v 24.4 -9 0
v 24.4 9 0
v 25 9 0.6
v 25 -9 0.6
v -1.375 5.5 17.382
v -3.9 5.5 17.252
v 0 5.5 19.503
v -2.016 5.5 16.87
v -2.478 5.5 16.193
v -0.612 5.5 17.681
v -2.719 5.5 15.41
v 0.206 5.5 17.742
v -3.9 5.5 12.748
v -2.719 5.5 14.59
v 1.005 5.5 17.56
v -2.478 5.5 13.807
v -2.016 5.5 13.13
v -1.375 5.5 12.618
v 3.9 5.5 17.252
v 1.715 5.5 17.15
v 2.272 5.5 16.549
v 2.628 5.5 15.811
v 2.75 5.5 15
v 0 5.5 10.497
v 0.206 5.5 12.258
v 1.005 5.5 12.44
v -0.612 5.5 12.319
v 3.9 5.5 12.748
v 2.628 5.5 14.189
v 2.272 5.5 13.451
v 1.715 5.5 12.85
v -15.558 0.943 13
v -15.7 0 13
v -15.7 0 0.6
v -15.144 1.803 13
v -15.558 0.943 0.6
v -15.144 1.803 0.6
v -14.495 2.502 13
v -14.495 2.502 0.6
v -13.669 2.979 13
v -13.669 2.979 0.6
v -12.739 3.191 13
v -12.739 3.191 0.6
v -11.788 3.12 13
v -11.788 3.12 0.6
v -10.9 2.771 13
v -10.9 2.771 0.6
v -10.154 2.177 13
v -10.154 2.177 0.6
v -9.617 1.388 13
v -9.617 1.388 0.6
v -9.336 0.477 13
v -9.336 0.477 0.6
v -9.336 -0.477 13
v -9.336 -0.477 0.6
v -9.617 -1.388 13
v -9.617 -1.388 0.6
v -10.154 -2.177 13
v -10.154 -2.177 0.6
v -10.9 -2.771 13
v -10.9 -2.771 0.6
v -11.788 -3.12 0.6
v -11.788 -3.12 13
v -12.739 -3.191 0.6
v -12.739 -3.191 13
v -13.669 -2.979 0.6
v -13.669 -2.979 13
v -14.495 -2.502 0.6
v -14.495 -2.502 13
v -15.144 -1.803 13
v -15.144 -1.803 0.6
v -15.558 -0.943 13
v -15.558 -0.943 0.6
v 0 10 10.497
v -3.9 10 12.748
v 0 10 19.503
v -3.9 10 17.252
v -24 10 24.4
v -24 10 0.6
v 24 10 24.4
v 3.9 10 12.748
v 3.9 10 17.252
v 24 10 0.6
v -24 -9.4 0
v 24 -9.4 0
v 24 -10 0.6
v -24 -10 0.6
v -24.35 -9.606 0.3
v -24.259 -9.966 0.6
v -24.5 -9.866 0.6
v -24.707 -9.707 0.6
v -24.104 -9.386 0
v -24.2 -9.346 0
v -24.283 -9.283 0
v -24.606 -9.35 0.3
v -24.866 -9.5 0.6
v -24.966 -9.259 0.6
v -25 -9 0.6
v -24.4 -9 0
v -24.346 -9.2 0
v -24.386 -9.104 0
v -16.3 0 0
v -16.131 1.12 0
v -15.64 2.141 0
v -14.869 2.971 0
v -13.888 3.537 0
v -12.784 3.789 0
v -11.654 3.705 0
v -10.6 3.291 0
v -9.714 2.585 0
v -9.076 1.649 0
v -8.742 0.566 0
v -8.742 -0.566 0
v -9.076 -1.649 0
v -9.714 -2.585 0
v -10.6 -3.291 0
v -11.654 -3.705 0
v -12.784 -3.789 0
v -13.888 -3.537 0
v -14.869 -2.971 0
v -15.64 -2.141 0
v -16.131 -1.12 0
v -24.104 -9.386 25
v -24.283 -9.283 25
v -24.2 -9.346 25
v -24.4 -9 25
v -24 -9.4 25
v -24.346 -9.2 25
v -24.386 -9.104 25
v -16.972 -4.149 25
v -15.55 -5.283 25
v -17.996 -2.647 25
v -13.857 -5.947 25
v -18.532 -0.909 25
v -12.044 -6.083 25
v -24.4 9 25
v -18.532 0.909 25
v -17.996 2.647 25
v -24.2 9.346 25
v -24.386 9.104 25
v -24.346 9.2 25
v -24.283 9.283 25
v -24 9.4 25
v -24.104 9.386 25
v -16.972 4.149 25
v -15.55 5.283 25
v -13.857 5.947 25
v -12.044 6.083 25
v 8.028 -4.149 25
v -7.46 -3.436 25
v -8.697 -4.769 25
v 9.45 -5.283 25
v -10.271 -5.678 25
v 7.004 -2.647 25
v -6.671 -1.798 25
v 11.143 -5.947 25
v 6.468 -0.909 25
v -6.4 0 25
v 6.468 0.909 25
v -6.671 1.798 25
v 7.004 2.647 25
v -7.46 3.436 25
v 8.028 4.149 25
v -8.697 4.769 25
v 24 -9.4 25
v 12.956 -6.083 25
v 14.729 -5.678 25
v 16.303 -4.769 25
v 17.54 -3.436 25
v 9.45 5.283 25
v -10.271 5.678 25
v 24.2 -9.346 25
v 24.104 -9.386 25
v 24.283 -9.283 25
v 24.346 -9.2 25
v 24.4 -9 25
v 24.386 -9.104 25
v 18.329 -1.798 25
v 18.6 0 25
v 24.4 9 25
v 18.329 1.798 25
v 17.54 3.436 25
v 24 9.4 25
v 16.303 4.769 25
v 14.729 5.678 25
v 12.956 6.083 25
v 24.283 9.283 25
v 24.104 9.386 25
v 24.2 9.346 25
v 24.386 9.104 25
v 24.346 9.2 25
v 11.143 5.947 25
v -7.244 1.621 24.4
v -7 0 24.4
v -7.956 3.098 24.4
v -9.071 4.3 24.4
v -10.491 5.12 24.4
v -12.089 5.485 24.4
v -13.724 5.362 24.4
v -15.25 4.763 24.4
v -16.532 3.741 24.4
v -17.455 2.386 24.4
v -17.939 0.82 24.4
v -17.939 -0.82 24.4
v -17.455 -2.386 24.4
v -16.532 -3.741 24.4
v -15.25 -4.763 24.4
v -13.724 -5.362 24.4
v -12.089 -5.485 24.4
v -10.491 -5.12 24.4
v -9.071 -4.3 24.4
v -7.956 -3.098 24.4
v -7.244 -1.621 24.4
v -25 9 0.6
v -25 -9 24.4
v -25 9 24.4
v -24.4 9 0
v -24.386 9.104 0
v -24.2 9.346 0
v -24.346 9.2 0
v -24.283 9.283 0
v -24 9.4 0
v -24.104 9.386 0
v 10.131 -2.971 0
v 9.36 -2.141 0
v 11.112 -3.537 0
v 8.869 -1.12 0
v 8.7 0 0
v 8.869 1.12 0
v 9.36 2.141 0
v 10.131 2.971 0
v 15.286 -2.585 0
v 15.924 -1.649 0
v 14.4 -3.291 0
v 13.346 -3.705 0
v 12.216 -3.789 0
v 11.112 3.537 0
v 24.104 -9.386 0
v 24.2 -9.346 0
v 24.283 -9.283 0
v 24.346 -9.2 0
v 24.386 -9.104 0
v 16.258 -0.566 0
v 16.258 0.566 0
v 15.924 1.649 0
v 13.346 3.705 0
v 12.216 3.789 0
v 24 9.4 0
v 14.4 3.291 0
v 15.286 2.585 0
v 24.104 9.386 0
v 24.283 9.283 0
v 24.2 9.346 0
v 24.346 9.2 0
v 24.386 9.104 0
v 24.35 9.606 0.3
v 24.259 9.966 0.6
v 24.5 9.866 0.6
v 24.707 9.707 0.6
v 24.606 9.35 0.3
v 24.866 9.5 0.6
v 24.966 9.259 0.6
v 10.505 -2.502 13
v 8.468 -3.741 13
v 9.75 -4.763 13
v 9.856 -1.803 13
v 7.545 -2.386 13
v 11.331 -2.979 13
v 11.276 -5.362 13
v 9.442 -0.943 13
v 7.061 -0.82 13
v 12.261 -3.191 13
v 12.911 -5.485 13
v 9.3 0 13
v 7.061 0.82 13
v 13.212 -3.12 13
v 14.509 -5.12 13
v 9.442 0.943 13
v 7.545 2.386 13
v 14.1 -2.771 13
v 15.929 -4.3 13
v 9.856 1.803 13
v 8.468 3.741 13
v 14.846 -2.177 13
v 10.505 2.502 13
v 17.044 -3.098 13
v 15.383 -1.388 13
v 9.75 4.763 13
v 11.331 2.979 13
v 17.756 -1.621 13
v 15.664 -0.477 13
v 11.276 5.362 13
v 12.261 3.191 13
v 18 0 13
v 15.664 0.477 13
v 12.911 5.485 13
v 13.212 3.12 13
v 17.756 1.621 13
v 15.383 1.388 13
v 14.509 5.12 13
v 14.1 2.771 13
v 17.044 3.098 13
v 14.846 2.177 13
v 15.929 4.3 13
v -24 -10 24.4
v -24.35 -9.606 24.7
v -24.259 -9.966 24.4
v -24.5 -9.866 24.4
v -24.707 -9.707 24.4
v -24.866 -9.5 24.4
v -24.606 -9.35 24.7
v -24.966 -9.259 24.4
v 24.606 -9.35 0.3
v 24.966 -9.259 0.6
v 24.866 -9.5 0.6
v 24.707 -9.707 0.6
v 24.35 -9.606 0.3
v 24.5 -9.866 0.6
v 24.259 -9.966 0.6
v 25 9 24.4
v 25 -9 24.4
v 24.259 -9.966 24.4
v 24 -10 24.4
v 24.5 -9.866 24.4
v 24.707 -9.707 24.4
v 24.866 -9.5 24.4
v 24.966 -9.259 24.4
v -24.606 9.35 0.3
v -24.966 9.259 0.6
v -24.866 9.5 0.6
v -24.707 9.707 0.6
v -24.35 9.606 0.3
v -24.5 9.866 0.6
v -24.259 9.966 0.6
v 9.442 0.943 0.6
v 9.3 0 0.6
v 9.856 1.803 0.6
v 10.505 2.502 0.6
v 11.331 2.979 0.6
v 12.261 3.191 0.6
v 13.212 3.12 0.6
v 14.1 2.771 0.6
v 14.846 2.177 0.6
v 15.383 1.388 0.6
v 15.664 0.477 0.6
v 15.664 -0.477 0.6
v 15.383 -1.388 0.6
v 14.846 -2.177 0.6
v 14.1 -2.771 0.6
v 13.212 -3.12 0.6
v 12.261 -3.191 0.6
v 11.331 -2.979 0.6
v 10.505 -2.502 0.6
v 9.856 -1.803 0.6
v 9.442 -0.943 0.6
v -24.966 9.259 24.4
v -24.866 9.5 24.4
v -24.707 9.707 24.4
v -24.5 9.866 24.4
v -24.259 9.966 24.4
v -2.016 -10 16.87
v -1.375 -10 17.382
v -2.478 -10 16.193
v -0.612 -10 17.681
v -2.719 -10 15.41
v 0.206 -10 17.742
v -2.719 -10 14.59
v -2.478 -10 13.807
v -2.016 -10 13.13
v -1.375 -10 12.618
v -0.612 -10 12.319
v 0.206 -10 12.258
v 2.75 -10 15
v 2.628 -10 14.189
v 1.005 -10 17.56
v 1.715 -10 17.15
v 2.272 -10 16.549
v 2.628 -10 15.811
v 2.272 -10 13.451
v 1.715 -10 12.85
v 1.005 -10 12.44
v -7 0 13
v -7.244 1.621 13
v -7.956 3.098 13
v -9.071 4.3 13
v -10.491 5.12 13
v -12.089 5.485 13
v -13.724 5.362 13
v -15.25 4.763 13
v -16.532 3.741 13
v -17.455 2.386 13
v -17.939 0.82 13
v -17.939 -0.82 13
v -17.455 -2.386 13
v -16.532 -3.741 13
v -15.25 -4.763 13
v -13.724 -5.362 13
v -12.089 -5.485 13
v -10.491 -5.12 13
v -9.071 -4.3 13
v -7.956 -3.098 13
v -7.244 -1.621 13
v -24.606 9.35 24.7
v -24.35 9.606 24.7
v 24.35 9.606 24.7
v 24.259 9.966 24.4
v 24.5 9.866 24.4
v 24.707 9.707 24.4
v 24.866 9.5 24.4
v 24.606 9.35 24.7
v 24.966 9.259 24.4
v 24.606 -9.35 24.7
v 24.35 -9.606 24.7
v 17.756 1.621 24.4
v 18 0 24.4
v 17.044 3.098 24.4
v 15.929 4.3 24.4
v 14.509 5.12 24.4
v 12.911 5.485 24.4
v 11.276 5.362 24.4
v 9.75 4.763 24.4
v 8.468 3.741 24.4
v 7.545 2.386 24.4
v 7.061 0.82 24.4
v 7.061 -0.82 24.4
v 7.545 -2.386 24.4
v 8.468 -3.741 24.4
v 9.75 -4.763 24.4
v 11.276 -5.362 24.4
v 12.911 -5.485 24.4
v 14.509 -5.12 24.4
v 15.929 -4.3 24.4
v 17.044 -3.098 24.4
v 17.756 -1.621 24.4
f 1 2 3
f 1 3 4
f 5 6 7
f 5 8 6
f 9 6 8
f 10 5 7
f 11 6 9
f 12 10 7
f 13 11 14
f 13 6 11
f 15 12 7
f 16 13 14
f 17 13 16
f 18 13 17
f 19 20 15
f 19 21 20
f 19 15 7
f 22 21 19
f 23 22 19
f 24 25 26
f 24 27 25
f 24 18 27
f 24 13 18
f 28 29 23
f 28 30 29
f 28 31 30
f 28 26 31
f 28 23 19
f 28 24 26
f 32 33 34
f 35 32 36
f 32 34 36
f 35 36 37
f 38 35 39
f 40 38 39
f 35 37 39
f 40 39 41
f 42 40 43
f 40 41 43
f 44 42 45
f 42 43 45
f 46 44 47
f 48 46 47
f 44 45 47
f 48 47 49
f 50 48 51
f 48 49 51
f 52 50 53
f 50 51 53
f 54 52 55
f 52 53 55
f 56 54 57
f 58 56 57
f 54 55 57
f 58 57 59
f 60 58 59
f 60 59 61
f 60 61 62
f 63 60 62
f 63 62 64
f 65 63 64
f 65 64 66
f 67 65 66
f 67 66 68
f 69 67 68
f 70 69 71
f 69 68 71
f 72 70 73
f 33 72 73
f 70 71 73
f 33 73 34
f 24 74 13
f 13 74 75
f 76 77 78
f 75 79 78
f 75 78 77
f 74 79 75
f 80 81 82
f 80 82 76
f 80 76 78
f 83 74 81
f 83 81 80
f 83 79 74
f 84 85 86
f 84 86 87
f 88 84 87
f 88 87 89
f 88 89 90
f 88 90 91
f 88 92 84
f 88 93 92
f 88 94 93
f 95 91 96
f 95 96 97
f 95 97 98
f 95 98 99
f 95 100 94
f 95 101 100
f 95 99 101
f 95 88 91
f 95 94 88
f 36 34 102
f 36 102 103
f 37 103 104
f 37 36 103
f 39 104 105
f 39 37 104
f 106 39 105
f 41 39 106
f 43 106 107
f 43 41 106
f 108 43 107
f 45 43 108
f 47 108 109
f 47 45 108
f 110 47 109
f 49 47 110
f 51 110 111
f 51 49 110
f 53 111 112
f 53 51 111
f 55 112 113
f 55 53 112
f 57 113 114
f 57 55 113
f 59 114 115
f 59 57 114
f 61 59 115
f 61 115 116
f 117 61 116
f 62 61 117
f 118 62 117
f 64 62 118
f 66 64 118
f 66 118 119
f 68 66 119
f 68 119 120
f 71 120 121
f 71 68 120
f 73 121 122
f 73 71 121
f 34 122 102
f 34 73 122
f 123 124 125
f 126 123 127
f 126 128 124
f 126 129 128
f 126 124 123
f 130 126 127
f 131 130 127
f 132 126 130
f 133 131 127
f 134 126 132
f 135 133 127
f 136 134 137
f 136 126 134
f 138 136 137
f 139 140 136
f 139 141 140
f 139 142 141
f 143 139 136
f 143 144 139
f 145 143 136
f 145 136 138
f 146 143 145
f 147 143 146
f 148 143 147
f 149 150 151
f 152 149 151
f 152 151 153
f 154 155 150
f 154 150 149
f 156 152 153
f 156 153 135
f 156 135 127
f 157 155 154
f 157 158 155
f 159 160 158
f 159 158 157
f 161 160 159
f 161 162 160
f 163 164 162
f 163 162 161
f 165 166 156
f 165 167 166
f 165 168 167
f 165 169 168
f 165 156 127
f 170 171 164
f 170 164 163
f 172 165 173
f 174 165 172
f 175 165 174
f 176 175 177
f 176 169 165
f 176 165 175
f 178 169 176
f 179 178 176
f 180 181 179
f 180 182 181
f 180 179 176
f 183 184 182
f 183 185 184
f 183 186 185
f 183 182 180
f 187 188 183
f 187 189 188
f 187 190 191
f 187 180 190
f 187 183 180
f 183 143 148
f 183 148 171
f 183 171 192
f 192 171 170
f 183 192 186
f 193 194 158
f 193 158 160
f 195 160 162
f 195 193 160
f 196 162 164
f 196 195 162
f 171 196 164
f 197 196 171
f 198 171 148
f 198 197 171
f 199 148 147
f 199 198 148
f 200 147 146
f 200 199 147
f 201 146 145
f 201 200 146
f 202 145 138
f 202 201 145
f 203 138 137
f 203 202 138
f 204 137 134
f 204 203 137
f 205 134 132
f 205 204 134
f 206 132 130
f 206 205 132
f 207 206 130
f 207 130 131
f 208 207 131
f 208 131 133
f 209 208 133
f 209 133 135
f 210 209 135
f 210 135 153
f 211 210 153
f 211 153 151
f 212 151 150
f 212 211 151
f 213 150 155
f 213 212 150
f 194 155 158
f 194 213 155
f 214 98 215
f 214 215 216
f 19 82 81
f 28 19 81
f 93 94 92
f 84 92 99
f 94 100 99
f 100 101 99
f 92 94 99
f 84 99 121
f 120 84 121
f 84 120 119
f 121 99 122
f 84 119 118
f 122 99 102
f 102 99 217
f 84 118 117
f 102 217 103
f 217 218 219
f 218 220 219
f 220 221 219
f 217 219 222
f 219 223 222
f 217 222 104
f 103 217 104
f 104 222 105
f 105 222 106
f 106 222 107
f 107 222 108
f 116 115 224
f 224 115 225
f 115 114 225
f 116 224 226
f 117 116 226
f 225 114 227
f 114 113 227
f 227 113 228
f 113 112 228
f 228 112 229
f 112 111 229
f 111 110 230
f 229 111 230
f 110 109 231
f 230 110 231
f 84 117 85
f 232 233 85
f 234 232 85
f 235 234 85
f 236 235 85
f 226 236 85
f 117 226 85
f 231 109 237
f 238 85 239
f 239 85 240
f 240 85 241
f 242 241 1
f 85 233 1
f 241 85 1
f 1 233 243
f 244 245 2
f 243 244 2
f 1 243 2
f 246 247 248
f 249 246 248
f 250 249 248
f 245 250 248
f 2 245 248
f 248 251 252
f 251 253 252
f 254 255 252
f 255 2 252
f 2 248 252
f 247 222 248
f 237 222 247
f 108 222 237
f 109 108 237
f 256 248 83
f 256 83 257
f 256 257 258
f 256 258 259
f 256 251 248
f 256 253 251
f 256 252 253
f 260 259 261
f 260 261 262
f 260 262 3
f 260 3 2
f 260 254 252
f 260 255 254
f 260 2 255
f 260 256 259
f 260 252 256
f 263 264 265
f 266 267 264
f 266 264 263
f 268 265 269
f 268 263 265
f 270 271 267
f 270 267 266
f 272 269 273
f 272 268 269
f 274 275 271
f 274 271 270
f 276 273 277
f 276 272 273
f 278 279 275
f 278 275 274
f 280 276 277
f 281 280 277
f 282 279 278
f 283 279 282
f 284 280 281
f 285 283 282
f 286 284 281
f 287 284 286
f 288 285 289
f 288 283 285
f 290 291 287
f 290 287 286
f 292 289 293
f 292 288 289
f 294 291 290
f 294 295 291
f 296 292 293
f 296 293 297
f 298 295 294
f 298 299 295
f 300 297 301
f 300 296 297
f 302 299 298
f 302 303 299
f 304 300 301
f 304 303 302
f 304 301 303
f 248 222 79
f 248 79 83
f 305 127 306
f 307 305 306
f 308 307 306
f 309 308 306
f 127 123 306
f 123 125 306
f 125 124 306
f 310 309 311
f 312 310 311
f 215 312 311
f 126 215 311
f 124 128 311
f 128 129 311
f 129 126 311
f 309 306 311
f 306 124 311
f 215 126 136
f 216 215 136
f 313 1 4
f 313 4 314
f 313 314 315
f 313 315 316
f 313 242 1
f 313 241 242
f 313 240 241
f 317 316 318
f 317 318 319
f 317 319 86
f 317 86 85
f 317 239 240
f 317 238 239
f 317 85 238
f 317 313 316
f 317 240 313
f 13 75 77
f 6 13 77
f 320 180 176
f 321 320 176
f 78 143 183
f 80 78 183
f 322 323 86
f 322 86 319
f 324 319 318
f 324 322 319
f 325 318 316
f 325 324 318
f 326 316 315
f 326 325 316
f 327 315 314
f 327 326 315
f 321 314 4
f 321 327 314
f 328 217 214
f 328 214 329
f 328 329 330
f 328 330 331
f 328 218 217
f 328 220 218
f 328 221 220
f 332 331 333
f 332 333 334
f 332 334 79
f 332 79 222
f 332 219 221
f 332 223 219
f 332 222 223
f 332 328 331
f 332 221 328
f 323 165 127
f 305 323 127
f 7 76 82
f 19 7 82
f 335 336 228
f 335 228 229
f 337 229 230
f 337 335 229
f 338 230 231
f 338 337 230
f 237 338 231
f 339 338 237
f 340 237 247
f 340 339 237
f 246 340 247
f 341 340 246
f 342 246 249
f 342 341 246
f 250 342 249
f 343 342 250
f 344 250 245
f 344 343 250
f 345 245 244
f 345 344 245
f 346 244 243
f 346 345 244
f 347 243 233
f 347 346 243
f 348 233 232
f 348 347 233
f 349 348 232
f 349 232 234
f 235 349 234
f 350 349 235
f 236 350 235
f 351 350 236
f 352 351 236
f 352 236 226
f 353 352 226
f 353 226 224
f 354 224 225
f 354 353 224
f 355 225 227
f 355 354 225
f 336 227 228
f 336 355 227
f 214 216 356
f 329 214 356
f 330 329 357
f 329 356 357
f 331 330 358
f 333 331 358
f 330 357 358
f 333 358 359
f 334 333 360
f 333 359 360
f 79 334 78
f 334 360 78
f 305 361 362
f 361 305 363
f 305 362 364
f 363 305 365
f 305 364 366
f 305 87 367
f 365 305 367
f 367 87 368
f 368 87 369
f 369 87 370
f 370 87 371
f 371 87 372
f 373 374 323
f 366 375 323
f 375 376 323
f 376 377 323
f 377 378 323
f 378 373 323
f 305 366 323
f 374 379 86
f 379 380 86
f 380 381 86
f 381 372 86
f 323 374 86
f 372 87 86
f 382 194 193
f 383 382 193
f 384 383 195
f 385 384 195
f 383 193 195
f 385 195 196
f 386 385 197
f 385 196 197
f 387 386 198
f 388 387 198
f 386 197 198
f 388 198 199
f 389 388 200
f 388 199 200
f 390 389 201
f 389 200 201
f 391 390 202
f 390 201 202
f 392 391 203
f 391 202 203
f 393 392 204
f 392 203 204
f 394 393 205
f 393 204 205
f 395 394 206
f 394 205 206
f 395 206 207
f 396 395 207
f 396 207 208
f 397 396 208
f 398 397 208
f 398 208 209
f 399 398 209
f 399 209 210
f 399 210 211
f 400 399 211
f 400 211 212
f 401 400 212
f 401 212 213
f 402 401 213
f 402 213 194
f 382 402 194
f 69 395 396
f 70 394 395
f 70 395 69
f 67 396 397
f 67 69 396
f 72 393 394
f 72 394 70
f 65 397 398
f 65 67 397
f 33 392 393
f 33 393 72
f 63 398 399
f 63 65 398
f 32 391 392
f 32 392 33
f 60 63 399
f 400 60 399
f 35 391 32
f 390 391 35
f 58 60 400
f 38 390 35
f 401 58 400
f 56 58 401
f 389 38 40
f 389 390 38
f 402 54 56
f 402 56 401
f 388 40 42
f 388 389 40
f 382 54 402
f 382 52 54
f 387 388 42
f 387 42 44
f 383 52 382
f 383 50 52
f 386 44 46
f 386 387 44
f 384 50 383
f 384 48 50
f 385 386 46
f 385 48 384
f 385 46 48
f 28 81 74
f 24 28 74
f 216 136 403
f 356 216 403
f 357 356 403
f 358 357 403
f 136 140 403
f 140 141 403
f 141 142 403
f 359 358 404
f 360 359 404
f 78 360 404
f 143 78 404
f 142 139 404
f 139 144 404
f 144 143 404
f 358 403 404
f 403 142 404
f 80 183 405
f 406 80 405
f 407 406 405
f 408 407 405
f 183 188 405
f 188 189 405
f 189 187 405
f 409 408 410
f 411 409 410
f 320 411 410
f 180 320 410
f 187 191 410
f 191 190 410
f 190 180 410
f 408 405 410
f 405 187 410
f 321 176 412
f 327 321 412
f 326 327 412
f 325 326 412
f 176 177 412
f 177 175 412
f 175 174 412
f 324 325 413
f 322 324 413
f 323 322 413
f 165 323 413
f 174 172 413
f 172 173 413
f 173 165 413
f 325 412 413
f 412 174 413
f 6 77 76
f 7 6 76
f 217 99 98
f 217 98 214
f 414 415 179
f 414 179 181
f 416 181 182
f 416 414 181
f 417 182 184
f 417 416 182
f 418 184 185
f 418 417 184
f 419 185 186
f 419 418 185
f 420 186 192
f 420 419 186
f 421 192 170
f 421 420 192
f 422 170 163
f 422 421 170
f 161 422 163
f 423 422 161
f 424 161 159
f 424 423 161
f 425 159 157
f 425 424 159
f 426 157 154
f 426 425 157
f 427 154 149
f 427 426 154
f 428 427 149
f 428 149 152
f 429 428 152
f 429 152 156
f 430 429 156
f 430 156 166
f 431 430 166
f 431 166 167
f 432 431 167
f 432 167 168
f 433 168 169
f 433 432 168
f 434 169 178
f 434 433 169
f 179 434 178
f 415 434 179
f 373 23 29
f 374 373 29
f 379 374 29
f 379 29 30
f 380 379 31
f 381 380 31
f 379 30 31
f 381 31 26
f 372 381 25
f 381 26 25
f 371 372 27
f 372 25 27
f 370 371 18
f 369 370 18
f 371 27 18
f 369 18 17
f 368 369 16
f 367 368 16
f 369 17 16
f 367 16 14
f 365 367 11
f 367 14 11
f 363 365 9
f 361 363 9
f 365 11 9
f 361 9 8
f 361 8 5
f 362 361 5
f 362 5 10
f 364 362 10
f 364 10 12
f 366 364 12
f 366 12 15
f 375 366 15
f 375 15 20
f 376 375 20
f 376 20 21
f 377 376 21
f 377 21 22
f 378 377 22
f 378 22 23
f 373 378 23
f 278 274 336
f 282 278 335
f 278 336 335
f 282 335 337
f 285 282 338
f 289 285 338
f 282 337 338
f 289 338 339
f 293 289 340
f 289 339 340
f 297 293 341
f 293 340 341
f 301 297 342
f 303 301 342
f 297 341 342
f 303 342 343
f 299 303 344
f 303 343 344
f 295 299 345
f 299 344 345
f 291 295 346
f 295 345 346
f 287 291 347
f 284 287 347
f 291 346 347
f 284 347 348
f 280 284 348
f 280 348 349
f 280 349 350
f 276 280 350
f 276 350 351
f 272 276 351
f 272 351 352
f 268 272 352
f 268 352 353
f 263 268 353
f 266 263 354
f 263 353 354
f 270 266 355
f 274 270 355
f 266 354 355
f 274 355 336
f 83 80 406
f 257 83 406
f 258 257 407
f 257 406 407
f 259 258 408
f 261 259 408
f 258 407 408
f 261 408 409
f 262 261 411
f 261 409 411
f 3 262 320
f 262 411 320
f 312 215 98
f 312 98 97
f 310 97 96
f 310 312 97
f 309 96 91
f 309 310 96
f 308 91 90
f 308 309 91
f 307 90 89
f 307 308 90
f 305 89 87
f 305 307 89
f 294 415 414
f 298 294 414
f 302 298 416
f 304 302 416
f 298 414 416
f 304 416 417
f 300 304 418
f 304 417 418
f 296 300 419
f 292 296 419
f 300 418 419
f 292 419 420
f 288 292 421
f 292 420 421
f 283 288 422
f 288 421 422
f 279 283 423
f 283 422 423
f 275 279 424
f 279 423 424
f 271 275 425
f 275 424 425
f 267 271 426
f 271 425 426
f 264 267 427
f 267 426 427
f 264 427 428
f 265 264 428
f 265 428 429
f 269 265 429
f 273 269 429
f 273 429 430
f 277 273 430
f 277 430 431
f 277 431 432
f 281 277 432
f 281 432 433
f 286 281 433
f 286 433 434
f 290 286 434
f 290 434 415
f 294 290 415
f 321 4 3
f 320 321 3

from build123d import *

# Parameters (mm, degrees)
SKETCH1_W                                           = 50
SKETCH1_H                                           = 20
BOSS_EXTRUDE1_DEPTH                                 = 25
CBORE_FOR_M6_HEX_SOCKET_HEAD_CAP_SCREW1_D           = 6.4
CBORE_FOR_M6_HEX_SOCKET_HEAD_CAP_SCREW1_CBORE_D     = 11
CBORE_FOR_M6_HEX_SOCKET_HEAD_CAP_SCREW1_CBORE_DEPTH = 12
M5_CLEARANCE_HOLE1_D                                = 5.5
CUT_EXTRUDE1_DEPTH                                  = 4.5
FILLET1_R                                           = 1
CHAMFER1_SIZE                                       = 0.6


with BuildPart() as part:
    # Sketch1 → Boss-Extrude1 (new body)
    with BuildSketch(Plane.XY):
        Rectangle(SKETCH1_W, SKETCH1_H)
    extrude(amount=BOSS_EXTRUDE1_DEPTH)

    # CBORE for M6 Hex Socket Head Cap Screw1 (through all)
    with Locations(Plane.XY.offset(25)):
        with Locations((-12.5, 0), (12.5, 0)):
            CounterBoreHole(CBORE_FOR_M6_HEX_SOCKET_HEAD_CAP_SCREW1_D / 2, CBORE_FOR_M6_HEX_SOCKET_HEAD_CAP_SCREW1_CBORE_D / 2, CBORE_FOR_M6_HEX_SOCKET_HEAD_CAP_SCREW1_CBORE_DEPTH)

    # M5 Clearance Hole1 (through all)
    with Locations(Plane(origin=(0, -10, 0), x_dir=(-1, 0, 0), z_dir=(0, -1, 0))):
        with Locations((0, -15)):
            Hole(M5_CLEARANCE_HOLE1_D / 2)

    # Sketch7 → Cut-Extrude1 (cut)
    with BuildSketch(Plane(origin=(0, 10, 0), x_dir=(1, 0, 0), z_dir=(0, 1, 0))):
        Polygon((3.9, -12.74833395), (0, -10.4966679), (-3.9, -12.74833395), (-3.9, -17.25166605), (0, -19.5033321), (3.9, -17.25166605), align=None)
    extrude(amount=-CUT_EXTRUDE1_DEPTH, mode=Mode.SUBTRACT)

    # Fillet1
    fillet1_edges = [part.edges().sort_by_distance(p)[0] for p in [
        (-25, 10, 12.5),
        (25, 10, 12.5),
        (25, -10, 12.5),
        (-25, -10, 12.5),
    ]]
    fillet(fillet1_edges, radius=FILLET1_R)

    # Chamfer1
    chamfer1_edges = [part.edges().sort_by_distance(p)[0] for p in [
        (7, 0, 25),
        (15.7, 0, 0),
        (-18, 0, 25),
        (-9.3, 0, 0),
        (-25, 0, 0),
        (-25, 0, 25),
        (0, 10, 0),
        (25, 0, 0),
        (0, -10, 0),
        (24.707106781, -9.707106781, 0),
        (24.707106781, 9.707106781, 0),
        (-24.707106781, -9.707106781, 0),
        (-24.707106781, 9.707106781, 0),
        (0, 10, 25),
        (0, -10, 25),
        (25, 0, 25),
        (24.707106781, -9.707106781, 25),
        (24.707106781, 9.707106781, 25),
        (-24.707106781, -9.707106781, 25),
        (-24.707106781, 9.707106781, 25),
    ]]
    chamfer(chamfer1_edges, length=CHAMFER1_SIZE)


solid = part.part
